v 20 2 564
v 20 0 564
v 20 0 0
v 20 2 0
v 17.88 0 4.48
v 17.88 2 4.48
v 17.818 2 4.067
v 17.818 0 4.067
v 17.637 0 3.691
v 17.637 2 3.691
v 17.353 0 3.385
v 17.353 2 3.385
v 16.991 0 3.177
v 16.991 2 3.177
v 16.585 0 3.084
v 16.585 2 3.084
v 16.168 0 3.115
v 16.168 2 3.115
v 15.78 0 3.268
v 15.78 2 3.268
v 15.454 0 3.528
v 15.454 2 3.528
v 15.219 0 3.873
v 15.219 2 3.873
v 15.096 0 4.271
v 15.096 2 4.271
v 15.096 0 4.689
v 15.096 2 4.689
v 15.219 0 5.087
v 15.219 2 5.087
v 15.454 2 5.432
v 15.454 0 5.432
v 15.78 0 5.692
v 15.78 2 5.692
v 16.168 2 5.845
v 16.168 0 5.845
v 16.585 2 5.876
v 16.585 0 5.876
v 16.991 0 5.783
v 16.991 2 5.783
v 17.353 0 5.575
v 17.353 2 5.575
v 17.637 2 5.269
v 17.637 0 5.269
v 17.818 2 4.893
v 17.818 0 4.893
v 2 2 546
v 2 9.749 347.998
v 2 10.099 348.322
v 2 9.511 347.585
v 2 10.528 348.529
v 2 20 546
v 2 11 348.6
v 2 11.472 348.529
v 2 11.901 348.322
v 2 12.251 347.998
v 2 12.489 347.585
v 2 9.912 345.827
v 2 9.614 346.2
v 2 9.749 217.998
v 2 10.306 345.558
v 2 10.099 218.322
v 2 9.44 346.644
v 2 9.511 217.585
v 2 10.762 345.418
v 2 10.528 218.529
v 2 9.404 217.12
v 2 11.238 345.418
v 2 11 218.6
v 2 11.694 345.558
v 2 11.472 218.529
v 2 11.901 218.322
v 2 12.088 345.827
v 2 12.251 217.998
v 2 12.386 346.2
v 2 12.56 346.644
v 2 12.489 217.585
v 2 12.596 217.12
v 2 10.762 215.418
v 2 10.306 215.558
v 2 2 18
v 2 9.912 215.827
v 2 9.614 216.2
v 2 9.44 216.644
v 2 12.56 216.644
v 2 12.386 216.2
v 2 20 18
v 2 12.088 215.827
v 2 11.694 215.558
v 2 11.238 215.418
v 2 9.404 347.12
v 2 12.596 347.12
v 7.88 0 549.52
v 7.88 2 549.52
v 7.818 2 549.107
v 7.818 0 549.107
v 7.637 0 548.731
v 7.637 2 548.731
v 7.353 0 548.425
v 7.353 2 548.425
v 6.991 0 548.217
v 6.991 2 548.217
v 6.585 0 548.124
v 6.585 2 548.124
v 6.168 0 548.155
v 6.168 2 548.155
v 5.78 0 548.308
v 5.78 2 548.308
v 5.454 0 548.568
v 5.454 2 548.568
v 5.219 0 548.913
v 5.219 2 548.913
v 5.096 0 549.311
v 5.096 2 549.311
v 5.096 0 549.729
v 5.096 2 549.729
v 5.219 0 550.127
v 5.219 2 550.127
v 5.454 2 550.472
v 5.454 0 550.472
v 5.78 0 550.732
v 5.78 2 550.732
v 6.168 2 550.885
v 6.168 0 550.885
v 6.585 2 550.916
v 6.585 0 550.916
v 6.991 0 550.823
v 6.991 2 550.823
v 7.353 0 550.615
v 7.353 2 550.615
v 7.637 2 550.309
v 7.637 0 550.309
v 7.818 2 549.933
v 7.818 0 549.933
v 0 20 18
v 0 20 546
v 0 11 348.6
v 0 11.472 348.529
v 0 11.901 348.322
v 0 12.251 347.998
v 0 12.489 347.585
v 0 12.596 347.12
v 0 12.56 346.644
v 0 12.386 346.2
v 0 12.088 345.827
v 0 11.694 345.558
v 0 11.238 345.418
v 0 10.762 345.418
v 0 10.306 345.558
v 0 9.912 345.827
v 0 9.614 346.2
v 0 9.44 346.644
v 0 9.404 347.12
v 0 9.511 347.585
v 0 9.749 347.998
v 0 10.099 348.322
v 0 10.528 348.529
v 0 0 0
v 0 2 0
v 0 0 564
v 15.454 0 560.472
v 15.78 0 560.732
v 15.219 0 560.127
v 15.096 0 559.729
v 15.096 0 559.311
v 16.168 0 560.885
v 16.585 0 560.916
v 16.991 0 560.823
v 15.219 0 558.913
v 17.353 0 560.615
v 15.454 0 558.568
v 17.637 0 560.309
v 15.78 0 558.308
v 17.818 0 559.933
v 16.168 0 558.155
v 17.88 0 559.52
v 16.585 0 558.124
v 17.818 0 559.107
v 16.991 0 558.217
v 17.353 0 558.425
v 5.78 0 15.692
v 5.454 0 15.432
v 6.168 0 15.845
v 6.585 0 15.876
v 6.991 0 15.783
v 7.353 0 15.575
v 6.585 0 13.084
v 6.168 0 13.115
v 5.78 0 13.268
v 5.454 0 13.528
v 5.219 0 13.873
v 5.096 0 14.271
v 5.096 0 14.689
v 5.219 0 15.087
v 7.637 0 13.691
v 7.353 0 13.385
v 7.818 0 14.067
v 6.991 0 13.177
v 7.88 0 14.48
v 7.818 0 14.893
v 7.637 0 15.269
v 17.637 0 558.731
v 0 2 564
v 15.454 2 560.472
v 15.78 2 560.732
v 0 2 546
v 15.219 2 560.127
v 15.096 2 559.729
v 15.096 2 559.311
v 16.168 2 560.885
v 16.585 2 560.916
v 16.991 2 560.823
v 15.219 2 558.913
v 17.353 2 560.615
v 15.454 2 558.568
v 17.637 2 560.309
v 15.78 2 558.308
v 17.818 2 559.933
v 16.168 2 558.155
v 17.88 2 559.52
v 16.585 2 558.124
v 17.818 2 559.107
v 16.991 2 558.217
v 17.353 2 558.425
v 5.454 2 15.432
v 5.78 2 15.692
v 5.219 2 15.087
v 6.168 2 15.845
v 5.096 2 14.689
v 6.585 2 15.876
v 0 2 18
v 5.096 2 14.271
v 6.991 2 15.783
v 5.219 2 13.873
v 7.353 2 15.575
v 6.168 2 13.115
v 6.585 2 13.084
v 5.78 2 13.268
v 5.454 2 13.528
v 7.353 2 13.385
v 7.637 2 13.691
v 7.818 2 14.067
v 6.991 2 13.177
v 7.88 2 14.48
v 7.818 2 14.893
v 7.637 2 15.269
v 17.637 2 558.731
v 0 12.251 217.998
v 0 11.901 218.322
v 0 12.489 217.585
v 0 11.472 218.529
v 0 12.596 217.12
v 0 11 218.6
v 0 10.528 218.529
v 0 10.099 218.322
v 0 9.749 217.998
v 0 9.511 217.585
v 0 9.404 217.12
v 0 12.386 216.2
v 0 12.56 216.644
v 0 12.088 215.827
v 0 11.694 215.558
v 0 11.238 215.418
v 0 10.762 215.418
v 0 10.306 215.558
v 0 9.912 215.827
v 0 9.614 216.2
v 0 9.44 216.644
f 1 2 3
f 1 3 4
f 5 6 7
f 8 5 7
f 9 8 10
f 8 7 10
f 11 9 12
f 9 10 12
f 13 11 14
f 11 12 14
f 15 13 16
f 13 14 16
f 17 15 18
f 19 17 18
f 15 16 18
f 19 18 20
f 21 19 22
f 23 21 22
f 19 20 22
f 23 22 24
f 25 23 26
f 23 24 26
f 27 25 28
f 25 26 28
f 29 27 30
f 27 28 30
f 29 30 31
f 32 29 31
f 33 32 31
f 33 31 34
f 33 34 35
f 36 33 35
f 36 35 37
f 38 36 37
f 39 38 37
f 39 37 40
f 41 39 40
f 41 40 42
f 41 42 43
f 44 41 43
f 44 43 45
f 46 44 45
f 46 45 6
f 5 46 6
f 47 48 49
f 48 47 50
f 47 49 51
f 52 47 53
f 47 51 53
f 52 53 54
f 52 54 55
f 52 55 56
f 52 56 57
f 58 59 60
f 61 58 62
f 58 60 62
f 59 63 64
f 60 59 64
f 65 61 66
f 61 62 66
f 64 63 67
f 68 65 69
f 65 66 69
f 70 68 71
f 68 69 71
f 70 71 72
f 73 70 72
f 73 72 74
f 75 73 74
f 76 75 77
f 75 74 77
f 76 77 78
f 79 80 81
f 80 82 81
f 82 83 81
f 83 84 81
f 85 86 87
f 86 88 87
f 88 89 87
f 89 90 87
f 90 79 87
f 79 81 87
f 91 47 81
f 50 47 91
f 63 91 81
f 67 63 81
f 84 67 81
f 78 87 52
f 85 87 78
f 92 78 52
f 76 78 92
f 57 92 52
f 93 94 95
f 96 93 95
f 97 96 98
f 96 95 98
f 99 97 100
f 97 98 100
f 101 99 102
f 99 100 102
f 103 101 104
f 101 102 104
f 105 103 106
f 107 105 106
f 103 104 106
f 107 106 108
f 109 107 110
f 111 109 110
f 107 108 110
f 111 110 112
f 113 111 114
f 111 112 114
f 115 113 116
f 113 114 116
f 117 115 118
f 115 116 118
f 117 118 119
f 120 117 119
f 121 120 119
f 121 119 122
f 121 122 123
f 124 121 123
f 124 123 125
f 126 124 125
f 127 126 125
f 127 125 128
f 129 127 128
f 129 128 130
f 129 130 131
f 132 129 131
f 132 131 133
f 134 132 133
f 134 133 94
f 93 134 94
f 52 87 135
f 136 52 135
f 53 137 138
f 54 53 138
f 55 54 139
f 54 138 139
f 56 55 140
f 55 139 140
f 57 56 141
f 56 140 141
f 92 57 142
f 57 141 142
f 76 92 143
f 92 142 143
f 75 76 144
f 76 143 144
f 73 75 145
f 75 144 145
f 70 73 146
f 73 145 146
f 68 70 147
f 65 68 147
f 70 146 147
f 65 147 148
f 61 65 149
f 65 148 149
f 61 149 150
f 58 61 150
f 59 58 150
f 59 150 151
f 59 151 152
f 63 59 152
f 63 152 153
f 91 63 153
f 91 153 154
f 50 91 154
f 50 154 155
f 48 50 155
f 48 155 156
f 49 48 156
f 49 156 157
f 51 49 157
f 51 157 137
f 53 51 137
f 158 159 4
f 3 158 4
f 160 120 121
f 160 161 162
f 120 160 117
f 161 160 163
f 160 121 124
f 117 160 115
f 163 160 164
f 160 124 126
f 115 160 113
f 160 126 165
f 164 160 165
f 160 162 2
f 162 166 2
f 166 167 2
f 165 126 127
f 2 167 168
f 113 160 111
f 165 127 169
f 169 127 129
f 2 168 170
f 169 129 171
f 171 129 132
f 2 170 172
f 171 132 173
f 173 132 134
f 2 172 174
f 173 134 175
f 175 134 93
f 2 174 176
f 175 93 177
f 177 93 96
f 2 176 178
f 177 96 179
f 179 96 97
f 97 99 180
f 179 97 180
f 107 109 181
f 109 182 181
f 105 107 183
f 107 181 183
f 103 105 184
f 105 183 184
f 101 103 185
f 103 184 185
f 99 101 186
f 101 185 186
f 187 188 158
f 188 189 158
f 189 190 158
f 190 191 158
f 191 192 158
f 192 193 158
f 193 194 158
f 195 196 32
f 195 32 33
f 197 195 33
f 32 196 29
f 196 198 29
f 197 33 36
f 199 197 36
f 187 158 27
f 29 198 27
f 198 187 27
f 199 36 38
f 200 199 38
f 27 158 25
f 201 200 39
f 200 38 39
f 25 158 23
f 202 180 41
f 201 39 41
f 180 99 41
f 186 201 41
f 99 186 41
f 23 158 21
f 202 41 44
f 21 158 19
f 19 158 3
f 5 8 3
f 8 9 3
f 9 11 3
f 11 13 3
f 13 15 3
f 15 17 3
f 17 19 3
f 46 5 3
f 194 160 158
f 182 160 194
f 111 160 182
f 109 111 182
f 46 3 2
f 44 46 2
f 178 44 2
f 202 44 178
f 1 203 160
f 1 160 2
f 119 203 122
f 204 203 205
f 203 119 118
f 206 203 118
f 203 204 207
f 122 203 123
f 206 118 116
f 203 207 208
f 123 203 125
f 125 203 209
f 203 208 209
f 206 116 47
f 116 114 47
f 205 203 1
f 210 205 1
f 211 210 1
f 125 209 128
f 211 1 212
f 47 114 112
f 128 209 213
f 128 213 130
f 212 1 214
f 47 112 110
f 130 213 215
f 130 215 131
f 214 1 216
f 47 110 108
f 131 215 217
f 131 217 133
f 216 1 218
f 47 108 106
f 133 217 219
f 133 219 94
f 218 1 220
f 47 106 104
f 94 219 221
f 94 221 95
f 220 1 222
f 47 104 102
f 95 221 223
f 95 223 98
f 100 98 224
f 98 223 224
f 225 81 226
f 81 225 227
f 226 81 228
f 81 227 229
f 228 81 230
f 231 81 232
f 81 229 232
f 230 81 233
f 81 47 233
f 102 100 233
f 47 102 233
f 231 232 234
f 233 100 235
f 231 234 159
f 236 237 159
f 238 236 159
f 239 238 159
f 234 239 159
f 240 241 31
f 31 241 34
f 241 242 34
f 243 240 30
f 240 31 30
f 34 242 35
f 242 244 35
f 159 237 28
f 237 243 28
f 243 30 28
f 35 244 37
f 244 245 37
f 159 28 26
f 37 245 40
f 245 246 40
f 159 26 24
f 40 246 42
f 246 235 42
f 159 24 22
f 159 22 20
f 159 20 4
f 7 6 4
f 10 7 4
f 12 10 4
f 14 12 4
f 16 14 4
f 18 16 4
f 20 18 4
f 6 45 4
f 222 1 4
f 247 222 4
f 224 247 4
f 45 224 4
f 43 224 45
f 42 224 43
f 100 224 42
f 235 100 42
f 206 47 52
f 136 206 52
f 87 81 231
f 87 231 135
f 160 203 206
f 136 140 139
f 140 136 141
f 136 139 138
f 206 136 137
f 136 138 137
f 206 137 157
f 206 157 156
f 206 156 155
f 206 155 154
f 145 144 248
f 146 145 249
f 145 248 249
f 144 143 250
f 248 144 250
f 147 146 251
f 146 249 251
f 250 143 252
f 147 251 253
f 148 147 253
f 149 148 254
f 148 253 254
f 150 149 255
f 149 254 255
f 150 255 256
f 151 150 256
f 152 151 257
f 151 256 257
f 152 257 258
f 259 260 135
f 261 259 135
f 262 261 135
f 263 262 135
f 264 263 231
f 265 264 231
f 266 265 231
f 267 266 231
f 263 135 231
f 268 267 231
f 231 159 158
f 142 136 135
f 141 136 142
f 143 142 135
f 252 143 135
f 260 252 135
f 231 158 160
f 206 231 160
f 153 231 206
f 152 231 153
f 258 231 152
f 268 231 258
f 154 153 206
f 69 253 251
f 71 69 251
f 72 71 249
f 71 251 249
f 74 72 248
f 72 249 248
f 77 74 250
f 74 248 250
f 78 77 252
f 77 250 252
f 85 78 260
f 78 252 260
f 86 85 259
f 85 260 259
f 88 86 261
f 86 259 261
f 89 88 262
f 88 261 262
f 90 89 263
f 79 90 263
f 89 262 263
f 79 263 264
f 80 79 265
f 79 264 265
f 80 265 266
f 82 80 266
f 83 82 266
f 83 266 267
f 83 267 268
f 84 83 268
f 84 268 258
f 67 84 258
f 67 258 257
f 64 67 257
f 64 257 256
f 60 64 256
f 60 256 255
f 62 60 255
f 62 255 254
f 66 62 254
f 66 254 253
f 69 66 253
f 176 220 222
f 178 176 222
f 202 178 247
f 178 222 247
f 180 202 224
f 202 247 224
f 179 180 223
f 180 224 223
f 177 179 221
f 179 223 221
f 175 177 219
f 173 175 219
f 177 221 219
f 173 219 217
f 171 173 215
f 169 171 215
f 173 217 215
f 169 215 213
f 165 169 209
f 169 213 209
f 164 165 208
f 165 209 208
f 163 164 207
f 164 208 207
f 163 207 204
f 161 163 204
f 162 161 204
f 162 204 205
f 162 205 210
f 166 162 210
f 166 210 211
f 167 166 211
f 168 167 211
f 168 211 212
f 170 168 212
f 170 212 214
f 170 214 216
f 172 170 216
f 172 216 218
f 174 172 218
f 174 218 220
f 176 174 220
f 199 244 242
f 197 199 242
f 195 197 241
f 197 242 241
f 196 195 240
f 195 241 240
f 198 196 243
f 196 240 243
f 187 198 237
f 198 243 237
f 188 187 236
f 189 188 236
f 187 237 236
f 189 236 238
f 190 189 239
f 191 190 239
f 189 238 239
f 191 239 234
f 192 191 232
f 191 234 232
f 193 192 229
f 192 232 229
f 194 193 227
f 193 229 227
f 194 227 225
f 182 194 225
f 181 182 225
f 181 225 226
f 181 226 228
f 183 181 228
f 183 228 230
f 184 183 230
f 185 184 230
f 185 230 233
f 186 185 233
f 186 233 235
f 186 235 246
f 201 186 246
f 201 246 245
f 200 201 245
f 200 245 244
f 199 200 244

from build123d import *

# Parameters (mm, degrees)
BOSS_EXTRU_1_DEPTH      = 564
ESQUISSE2_W             = 18
ESQUISSE2_H             = 18
ENL_V_MAT_EXTRU_1_DEPTH = 3
ESQUISSE6_R             = 1.4
ENL_V_MAT_EXTRU_5_DEPTH = 3
SKETCH1_R               = 1.6
CUT_EXTRUDE1_DEPTH      = 21


with BuildPart() as part:
    # Esquisse1 → Boss.-Extru.1 (new body)
    with BuildSketch(Plane.XY):
        Polygon((0, 0), (20, 0), (20, 2), (2, 2), (2, 20), (0, 20), align=None)
    extrude(amount=BOSS_EXTRU_1_DEPTH)

    # Esquisse2 → Enlèv. mat.-Extru.1 (cut, through all)
    with BuildSketch(Plane(origin=(2, 0, 0), x_dir=(0, 0, -1), z_dir=(1, 0, 0))):
        with Locations((-555, 11)):
            Rectangle(ESQUISSE2_W, ESQUISSE2_H)
        with Locations((-9, 11)):
            Rectangle(ESQUISSE2_W, ESQUISSE2_H)
    extrude(amount=-ENL_V_MAT_EXTRU_1_DEPTH, mode=Mode.SUBTRACT)

    # Esquisse6 → Enlèv. mat.-Extru.5 (cut, through all)
    with BuildSketch(Plane(origin=(0, 2, 0), x_dir=(1, 0, 0), z_dir=(0, 1, 0))):
        with Locations((6.48, -549.52)):
            Circle(ESQUISSE6_R)
        with Locations((6.48, -14.48)):
            Circle(ESQUISSE6_R)
        with Locations((16.48, -559.52)):
            Circle(ESQUISSE6_R)
        with Locations((16.48, -4.48)):
            Circle(ESQUISSE6_R)
    extrude(amount=-ENL_V_MAT_EXTRU_5_DEPTH, mode=Mode.SUBTRACT)

    # Sketch1 → Cut-Extrude1 (cut, through all)
    with BuildSketch(Plane.ZY):
        with Locations((217, 11)):
            Circle(SKETCH1_R)
        with Locations((347, 11)):
            Circle(SKETCH1_R)
    extrude(amount=-CUT_EXTRUDE1_DEPTH, mode=Mode.SUBTRACT)


solid = part.part
